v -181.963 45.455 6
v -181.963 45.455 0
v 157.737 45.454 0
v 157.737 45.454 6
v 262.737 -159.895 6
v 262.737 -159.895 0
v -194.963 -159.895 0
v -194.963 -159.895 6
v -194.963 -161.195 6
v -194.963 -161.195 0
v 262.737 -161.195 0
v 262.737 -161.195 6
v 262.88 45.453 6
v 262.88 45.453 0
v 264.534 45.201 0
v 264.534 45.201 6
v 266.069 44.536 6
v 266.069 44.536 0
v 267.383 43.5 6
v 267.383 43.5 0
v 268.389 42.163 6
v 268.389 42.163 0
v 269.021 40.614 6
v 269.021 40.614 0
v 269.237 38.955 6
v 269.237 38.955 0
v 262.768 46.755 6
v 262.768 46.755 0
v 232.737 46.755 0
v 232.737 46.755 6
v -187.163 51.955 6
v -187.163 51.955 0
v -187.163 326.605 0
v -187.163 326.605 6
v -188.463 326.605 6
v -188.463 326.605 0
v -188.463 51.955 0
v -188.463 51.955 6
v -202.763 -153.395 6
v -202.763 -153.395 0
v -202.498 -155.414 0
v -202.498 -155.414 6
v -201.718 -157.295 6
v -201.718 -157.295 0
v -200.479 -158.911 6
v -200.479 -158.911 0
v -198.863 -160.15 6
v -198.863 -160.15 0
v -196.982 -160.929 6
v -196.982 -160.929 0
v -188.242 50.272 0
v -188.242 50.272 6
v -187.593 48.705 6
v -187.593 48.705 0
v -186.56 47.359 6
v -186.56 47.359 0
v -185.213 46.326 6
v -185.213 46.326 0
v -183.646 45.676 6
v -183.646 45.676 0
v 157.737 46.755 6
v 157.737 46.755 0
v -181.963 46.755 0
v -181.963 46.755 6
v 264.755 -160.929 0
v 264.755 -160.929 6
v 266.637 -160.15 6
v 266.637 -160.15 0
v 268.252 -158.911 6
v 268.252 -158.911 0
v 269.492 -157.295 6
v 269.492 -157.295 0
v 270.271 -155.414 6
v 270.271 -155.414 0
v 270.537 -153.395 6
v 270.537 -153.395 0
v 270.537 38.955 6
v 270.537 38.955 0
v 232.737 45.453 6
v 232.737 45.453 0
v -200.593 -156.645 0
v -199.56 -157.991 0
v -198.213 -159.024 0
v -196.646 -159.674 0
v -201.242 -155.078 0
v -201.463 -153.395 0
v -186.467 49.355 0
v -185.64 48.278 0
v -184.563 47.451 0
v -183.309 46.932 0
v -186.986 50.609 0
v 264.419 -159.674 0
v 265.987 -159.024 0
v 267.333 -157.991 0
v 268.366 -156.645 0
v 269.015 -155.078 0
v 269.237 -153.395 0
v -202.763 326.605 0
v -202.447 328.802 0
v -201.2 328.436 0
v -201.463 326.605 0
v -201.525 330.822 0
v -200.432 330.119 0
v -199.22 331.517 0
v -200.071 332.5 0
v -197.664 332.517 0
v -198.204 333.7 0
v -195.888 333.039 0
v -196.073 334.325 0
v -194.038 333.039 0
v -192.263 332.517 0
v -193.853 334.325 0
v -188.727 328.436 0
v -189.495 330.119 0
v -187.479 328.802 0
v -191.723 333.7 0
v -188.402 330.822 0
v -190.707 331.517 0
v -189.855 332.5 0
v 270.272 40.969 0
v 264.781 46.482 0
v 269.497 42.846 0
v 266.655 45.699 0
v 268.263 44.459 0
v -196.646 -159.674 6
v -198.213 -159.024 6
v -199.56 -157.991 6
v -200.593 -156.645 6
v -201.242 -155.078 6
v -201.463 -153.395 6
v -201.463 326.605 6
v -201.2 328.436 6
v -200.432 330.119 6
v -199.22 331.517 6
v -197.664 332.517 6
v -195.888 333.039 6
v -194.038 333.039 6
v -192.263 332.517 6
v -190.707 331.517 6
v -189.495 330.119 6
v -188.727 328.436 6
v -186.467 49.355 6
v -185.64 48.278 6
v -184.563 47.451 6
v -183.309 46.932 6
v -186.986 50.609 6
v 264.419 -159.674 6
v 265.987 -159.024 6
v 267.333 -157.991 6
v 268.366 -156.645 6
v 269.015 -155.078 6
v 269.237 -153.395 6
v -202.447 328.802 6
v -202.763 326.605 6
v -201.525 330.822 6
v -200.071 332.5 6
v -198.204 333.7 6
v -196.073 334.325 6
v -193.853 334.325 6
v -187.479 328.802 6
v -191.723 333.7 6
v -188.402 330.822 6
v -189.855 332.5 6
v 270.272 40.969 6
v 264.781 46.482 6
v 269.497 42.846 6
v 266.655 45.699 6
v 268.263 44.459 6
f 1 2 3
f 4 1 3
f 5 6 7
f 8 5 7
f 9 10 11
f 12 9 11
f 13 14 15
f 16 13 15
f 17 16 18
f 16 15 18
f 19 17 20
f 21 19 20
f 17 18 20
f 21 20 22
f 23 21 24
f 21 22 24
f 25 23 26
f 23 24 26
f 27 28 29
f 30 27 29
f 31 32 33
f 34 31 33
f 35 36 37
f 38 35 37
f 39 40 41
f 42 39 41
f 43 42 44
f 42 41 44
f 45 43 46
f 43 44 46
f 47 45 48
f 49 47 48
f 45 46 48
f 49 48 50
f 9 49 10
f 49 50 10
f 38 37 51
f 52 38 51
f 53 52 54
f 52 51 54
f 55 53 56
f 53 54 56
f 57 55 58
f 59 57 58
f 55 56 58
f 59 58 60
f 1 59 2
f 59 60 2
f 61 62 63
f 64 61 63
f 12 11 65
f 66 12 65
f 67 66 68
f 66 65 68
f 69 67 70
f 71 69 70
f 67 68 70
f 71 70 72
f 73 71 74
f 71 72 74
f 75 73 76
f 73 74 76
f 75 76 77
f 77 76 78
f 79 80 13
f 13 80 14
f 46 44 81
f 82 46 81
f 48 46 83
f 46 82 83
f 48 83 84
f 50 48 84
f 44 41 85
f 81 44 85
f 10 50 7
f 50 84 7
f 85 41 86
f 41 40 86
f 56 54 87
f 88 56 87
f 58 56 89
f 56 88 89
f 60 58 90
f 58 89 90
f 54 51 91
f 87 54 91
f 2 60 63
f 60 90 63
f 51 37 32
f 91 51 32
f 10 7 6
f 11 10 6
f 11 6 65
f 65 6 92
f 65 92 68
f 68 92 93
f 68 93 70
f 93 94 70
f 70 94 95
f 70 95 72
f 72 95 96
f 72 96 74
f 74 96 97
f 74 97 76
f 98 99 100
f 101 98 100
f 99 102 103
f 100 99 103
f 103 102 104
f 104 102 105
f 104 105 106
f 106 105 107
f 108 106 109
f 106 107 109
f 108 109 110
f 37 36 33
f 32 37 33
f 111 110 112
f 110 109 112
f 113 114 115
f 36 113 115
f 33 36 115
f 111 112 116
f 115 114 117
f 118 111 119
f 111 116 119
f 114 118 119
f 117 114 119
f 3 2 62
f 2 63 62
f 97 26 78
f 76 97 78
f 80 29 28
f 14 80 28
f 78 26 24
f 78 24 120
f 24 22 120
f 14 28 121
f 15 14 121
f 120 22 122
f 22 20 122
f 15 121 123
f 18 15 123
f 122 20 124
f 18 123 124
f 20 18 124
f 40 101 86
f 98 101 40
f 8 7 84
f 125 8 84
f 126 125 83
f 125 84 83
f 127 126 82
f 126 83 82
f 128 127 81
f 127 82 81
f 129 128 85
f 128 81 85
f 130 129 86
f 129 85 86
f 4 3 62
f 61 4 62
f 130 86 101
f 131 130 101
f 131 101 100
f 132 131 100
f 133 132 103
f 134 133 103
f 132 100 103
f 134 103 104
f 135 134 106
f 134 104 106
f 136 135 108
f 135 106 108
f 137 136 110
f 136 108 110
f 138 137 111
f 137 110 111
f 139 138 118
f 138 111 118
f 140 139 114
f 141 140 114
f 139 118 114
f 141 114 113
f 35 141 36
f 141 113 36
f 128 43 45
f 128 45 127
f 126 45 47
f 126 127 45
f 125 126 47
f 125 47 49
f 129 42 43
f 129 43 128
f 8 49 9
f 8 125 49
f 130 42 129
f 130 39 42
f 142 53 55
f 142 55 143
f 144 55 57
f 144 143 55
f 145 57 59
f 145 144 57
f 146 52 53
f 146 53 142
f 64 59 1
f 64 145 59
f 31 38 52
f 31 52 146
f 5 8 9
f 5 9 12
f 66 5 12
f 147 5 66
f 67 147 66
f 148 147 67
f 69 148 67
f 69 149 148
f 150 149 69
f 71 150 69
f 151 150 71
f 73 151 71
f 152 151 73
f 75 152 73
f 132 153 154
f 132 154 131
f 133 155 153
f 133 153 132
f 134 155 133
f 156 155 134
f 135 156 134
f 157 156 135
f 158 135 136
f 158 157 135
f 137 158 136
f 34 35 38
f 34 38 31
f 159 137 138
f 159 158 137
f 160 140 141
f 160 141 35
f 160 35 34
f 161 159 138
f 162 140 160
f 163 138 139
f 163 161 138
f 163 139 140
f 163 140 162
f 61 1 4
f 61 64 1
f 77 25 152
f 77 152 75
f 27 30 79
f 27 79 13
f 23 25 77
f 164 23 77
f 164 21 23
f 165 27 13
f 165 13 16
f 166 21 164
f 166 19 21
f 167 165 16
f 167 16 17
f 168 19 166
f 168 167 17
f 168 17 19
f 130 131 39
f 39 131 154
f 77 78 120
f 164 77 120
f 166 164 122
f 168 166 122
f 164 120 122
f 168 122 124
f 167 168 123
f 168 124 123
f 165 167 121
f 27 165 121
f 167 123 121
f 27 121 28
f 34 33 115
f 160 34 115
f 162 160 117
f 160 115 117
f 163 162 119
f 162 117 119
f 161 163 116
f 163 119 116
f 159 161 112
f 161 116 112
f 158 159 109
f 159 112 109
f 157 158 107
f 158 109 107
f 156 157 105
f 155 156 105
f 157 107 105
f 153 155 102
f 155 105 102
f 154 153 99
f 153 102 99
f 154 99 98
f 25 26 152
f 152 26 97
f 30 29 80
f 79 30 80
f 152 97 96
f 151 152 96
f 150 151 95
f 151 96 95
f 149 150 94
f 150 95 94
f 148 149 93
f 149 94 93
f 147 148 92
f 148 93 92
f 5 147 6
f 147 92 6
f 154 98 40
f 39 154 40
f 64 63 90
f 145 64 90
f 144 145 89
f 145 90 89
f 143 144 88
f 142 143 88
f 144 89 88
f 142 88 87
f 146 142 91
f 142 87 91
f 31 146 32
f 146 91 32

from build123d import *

# Parameters (mm, degrees)
F1_DEPTH = 6


with BuildPart() as f1:
    # F0 (on Top) → F1 (new body)
    with BuildSketch(Plane.XY):
        with BuildLine():
            ThreePointArc((-201.463409, 326.604773), (-194.963409, 333.104773), (-188.463409, 326.604773))
            Line((-188.463409, 326.604773), (-188.463409, 51.954773))
            ThreePointArc((-188.463409, 51.954773), (-186.559603, 47.358579), (-181.963409, 45.454773))
            Line((-181.963409, 45.454773), (157.736591, 45.453617))
            Line((157.736591, 45.453617), (157.736591, 46.754773))
            Line((157.736591, 46.754773), (-181.963409, 46.754773))
            ThreePointArc((-181.963409, 46.754773), (-185.640364, 48.277818), (-187.163409, 51.954773))
            Line((-187.163409, 51.954773), (-187.163409, 326.604773))
            ThreePointArc((-187.163409, 326.604773), (-194.963409, 334.404773), (-202.763409, 326.604773))
            Line((-202.763409, 326.604773), (-202.763409, -153.395227))
            ThreePointArc((-202.763409, -153.395227), (-200.478842, -158.910659), (-194.963409, -161.195227))
            Line((-194.963409, -161.195227), (262.736591, -161.195227))
            ThreePointArc((262.736591, -161.195227), (268.252024, -158.910659), (270.536591, -153.395227))
            Line((270.536591, -153.395227), (270.536591, 38.954837))
            ThreePointArc((270.536591, 38.954837), (268.263179, 44.459093), (262.768173, 46.754773))
            Line((262.768173, 46.754773), (232.736591, 46.754773))
            Line((232.736591, 46.754773), (232.736591, 45.453361))
            Line((232.736591, 45.453361), (262.879846, 45.453259))
            ThreePointArc((262.879846, 45.453259), (267.383157, 43.500101), (269.236591, 38.954837))
            Line((269.236591, 38.954837), (269.236591, -153.395227))
            ThreePointArc((269.236591, -153.395227), (267.332785, -157.991421), (262.736591, -159.895227))
            Line((262.736591, -159.895227), (-194.963409, -159.895227))
            ThreePointArc((-194.963409, -159.895227), (-199.559603, -157.991421), (-201.463409, -153.395227))
            Line((-201.463409, -153.395227), (-201.463409, 326.604773))
        make_face()
    extrude(amount=F1_DEPTH)


solid = f1.part
